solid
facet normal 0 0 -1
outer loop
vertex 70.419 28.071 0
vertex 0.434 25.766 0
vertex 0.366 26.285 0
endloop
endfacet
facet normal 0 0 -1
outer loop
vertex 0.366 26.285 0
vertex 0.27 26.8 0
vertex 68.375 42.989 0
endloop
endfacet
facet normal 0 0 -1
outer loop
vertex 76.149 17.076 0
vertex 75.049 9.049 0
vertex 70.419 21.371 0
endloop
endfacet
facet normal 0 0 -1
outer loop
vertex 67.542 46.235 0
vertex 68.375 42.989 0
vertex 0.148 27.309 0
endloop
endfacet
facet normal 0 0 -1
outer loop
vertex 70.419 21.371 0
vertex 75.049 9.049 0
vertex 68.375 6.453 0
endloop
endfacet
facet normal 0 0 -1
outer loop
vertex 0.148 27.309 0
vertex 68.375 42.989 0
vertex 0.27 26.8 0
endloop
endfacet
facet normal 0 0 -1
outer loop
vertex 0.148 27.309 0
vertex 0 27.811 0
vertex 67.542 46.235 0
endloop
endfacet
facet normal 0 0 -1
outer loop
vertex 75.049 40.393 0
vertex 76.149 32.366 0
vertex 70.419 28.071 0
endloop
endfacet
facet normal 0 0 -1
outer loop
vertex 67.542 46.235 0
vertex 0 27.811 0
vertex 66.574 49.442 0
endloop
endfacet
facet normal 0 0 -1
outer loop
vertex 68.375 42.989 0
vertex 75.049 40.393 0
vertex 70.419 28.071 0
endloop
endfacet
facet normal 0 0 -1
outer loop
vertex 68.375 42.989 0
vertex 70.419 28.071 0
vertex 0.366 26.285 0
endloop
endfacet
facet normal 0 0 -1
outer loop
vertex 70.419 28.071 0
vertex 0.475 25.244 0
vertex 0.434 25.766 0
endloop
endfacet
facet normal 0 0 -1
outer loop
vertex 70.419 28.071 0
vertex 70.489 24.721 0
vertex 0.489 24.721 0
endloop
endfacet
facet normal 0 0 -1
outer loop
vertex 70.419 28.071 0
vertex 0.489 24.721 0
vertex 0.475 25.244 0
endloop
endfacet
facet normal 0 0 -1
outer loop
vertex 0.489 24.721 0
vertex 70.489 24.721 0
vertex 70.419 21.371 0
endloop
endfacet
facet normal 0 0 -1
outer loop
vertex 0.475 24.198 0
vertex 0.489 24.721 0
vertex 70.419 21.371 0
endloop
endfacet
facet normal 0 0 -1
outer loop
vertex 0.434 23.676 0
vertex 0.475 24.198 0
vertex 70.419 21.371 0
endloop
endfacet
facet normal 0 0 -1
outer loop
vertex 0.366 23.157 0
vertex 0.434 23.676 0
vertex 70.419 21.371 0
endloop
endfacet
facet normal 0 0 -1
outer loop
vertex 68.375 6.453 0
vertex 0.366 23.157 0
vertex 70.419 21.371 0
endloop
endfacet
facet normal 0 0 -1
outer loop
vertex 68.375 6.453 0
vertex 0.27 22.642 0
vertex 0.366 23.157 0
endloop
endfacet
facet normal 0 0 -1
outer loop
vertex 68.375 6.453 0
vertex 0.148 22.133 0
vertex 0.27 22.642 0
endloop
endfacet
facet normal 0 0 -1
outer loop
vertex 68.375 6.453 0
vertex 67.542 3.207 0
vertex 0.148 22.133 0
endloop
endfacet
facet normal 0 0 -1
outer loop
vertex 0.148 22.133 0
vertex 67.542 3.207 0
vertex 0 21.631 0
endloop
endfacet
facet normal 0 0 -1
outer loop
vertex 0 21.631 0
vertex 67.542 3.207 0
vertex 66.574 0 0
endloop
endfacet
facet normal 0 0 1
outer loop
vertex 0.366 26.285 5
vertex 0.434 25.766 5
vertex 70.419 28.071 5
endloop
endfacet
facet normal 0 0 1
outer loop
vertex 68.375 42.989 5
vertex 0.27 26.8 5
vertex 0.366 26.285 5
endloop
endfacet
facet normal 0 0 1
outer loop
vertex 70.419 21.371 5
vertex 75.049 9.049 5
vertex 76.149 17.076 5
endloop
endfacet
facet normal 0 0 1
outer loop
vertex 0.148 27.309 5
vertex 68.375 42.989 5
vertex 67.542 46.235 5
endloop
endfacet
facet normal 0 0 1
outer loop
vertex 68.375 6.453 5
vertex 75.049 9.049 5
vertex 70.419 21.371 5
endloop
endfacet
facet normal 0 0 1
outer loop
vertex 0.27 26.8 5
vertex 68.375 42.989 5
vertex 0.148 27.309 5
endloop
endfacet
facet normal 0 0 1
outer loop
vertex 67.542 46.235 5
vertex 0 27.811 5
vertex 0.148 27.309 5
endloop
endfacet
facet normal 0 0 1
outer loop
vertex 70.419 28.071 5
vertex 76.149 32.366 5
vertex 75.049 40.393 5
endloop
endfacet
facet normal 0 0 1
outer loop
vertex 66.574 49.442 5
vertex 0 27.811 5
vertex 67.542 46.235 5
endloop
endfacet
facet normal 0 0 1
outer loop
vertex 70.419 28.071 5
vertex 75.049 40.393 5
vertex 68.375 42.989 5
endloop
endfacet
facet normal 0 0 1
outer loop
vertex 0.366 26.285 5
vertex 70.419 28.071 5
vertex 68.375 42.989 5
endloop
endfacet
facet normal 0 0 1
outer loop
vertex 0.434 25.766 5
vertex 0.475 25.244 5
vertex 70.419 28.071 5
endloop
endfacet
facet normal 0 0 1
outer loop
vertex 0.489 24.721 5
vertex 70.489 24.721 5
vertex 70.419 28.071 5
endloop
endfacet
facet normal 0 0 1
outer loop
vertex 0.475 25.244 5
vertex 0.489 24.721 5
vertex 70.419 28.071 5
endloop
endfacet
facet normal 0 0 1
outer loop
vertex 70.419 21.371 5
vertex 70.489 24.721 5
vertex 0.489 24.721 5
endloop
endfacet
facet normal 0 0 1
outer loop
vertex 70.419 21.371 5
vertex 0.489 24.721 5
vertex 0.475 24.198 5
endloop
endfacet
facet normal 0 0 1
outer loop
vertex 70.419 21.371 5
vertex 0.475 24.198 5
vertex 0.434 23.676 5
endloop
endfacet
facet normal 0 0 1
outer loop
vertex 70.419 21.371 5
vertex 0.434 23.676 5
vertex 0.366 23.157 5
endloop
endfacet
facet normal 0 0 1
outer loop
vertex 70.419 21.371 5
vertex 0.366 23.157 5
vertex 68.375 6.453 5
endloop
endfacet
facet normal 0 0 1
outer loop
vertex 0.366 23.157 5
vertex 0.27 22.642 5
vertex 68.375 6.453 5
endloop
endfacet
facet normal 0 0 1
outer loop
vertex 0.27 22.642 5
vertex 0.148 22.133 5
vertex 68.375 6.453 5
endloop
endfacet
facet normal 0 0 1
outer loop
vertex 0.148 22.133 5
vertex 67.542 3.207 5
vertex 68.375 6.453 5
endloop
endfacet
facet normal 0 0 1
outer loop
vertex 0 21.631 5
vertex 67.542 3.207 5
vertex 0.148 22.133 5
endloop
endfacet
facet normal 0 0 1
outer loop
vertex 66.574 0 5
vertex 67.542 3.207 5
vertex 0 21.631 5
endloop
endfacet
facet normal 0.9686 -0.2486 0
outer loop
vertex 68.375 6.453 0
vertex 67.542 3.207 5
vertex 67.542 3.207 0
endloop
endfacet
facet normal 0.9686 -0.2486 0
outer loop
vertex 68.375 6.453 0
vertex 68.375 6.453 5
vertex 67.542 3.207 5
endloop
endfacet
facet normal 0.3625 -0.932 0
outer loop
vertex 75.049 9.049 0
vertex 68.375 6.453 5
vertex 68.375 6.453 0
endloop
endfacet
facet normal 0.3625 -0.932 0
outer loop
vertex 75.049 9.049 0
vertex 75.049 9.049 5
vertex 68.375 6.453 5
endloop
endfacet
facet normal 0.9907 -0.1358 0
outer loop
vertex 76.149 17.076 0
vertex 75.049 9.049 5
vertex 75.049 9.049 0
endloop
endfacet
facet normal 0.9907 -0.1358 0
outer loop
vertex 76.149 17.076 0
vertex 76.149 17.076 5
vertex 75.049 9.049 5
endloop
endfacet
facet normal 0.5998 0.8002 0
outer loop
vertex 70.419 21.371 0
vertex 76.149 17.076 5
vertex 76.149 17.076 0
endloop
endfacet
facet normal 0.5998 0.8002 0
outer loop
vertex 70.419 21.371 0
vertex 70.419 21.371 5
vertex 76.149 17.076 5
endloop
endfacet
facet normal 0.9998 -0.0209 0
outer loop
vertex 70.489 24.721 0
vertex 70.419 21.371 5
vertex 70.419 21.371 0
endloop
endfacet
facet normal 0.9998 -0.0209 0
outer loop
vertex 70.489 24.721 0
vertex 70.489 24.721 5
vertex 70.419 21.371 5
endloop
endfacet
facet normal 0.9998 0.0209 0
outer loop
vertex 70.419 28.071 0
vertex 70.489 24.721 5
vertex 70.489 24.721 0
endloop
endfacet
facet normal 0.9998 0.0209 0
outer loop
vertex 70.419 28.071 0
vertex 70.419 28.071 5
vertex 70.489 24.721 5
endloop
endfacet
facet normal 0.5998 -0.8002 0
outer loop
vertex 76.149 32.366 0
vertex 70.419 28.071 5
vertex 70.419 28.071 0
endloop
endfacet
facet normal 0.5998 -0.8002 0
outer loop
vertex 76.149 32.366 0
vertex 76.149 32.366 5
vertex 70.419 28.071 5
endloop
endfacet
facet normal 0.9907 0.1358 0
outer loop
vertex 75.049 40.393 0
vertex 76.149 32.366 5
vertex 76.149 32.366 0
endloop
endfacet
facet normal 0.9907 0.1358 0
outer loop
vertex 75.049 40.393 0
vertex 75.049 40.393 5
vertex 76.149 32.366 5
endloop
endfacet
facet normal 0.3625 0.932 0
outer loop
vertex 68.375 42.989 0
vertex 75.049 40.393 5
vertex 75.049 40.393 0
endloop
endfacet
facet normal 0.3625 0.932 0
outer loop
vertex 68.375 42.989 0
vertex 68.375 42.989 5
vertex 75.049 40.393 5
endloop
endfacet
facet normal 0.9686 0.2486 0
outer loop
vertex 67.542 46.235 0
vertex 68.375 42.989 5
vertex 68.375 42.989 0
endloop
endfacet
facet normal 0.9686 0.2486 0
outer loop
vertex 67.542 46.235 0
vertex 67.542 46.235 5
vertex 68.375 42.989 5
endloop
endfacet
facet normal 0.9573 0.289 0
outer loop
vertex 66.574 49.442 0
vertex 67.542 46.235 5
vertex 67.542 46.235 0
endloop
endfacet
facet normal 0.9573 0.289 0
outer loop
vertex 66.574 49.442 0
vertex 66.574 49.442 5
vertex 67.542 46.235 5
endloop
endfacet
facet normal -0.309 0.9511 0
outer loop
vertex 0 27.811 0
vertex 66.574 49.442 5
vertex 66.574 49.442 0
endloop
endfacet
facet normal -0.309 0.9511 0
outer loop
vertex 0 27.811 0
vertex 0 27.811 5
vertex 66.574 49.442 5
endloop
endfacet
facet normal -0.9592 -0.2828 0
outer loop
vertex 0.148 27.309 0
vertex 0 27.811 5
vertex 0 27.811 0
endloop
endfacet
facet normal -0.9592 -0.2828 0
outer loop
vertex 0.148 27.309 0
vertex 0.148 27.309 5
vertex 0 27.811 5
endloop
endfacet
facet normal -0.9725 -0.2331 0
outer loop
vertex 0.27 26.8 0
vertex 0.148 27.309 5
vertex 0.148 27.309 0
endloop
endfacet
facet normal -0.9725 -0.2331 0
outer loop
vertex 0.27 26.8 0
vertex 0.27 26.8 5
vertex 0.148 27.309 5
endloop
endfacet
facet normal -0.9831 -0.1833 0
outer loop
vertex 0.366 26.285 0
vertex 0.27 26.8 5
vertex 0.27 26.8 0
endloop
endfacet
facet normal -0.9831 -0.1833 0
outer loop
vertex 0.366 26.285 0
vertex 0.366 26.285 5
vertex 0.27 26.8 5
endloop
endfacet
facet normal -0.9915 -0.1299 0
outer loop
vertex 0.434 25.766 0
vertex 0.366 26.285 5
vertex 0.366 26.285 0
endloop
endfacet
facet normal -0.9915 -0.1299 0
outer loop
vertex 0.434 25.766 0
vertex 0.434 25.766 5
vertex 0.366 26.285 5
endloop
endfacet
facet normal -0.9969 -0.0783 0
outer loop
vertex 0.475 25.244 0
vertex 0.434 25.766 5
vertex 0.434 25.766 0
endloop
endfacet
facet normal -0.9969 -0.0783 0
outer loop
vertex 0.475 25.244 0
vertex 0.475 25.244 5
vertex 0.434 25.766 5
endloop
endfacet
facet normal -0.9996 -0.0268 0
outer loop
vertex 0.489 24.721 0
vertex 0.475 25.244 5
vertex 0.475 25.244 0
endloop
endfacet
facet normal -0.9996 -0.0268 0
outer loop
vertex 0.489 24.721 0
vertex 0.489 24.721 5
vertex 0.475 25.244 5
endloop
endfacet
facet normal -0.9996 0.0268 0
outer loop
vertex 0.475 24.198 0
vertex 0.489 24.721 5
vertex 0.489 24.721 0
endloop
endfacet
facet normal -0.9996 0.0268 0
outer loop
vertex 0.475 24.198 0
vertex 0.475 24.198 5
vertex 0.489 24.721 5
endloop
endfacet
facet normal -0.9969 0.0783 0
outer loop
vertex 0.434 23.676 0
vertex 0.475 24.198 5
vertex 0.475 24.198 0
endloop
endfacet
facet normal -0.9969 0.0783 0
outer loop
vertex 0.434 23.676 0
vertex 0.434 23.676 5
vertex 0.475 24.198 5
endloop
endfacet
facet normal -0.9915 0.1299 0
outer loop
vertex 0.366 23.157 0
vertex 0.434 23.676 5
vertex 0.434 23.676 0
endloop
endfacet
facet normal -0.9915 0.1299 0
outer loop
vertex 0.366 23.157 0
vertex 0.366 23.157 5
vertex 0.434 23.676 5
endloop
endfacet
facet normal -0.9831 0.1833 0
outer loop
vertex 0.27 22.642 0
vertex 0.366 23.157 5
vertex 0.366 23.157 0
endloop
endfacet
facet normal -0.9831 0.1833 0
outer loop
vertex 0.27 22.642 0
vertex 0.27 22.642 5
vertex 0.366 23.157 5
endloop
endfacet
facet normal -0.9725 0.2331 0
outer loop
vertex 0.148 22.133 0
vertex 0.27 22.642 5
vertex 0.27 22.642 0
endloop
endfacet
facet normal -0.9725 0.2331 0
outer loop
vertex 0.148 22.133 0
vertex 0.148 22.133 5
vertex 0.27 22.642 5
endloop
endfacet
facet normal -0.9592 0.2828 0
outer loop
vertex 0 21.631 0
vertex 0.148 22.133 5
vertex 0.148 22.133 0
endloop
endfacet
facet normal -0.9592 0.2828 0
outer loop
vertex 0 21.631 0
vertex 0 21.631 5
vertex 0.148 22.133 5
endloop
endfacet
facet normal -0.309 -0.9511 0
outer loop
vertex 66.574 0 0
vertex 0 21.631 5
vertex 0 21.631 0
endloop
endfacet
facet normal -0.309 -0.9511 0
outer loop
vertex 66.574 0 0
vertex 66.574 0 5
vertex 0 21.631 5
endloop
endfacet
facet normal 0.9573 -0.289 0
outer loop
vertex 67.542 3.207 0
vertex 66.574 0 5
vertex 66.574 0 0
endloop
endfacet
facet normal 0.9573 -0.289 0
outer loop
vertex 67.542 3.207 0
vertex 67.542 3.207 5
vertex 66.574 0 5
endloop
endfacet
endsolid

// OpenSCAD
$fn = 32;

// ----------------------------------------------------------------------
// Gear sector: 2 teeth on 36 degrees
// ----------------------------------------------------------------------

// --- parameters (mm) ---
sector_angle = 36;        // sector angle, degrees
root_r = 80;              // root circle radius
tooth_h = 6;              // tooth height over the root circle
teeth = 2;                // number of teeth on the sector
hub_r = 10;               // hub bore radius
plate_t = 5;              // sector thickness, Z
arc_step = 3;             // sampling step of the root/hub arcs, degrees

tip_r = root_r + tooth_h;  // tip circle radius

profile = [[66.574, 0], [67.542, 3.207], [68.375, 6.453], [75.049, 9.049], [76.149, 17.076], [70.419, 21.371], [70.489, 24.721], [70.419, 28.071], [76.149, 32.366], [75.049, 40.393], [68.375, 42.989], [67.542, 46.235], [66.574, 49.442], [0, 27.811], [0.148, 27.309], [0.27, 26.8], [0.366, 26.285], [0.434, 25.766], [0.475, 25.244], [0.489, 24.721], [0.475, 24.198], [0.434, 23.676], [0.366, 23.157], [0.27, 22.642], [0.148, 22.133], [0, 21.631]];  // primary outline, 26 points, counter clockwise

// --- the one profile operation ---
linear_extrude(height = plate_t) polygon(points = profile);
